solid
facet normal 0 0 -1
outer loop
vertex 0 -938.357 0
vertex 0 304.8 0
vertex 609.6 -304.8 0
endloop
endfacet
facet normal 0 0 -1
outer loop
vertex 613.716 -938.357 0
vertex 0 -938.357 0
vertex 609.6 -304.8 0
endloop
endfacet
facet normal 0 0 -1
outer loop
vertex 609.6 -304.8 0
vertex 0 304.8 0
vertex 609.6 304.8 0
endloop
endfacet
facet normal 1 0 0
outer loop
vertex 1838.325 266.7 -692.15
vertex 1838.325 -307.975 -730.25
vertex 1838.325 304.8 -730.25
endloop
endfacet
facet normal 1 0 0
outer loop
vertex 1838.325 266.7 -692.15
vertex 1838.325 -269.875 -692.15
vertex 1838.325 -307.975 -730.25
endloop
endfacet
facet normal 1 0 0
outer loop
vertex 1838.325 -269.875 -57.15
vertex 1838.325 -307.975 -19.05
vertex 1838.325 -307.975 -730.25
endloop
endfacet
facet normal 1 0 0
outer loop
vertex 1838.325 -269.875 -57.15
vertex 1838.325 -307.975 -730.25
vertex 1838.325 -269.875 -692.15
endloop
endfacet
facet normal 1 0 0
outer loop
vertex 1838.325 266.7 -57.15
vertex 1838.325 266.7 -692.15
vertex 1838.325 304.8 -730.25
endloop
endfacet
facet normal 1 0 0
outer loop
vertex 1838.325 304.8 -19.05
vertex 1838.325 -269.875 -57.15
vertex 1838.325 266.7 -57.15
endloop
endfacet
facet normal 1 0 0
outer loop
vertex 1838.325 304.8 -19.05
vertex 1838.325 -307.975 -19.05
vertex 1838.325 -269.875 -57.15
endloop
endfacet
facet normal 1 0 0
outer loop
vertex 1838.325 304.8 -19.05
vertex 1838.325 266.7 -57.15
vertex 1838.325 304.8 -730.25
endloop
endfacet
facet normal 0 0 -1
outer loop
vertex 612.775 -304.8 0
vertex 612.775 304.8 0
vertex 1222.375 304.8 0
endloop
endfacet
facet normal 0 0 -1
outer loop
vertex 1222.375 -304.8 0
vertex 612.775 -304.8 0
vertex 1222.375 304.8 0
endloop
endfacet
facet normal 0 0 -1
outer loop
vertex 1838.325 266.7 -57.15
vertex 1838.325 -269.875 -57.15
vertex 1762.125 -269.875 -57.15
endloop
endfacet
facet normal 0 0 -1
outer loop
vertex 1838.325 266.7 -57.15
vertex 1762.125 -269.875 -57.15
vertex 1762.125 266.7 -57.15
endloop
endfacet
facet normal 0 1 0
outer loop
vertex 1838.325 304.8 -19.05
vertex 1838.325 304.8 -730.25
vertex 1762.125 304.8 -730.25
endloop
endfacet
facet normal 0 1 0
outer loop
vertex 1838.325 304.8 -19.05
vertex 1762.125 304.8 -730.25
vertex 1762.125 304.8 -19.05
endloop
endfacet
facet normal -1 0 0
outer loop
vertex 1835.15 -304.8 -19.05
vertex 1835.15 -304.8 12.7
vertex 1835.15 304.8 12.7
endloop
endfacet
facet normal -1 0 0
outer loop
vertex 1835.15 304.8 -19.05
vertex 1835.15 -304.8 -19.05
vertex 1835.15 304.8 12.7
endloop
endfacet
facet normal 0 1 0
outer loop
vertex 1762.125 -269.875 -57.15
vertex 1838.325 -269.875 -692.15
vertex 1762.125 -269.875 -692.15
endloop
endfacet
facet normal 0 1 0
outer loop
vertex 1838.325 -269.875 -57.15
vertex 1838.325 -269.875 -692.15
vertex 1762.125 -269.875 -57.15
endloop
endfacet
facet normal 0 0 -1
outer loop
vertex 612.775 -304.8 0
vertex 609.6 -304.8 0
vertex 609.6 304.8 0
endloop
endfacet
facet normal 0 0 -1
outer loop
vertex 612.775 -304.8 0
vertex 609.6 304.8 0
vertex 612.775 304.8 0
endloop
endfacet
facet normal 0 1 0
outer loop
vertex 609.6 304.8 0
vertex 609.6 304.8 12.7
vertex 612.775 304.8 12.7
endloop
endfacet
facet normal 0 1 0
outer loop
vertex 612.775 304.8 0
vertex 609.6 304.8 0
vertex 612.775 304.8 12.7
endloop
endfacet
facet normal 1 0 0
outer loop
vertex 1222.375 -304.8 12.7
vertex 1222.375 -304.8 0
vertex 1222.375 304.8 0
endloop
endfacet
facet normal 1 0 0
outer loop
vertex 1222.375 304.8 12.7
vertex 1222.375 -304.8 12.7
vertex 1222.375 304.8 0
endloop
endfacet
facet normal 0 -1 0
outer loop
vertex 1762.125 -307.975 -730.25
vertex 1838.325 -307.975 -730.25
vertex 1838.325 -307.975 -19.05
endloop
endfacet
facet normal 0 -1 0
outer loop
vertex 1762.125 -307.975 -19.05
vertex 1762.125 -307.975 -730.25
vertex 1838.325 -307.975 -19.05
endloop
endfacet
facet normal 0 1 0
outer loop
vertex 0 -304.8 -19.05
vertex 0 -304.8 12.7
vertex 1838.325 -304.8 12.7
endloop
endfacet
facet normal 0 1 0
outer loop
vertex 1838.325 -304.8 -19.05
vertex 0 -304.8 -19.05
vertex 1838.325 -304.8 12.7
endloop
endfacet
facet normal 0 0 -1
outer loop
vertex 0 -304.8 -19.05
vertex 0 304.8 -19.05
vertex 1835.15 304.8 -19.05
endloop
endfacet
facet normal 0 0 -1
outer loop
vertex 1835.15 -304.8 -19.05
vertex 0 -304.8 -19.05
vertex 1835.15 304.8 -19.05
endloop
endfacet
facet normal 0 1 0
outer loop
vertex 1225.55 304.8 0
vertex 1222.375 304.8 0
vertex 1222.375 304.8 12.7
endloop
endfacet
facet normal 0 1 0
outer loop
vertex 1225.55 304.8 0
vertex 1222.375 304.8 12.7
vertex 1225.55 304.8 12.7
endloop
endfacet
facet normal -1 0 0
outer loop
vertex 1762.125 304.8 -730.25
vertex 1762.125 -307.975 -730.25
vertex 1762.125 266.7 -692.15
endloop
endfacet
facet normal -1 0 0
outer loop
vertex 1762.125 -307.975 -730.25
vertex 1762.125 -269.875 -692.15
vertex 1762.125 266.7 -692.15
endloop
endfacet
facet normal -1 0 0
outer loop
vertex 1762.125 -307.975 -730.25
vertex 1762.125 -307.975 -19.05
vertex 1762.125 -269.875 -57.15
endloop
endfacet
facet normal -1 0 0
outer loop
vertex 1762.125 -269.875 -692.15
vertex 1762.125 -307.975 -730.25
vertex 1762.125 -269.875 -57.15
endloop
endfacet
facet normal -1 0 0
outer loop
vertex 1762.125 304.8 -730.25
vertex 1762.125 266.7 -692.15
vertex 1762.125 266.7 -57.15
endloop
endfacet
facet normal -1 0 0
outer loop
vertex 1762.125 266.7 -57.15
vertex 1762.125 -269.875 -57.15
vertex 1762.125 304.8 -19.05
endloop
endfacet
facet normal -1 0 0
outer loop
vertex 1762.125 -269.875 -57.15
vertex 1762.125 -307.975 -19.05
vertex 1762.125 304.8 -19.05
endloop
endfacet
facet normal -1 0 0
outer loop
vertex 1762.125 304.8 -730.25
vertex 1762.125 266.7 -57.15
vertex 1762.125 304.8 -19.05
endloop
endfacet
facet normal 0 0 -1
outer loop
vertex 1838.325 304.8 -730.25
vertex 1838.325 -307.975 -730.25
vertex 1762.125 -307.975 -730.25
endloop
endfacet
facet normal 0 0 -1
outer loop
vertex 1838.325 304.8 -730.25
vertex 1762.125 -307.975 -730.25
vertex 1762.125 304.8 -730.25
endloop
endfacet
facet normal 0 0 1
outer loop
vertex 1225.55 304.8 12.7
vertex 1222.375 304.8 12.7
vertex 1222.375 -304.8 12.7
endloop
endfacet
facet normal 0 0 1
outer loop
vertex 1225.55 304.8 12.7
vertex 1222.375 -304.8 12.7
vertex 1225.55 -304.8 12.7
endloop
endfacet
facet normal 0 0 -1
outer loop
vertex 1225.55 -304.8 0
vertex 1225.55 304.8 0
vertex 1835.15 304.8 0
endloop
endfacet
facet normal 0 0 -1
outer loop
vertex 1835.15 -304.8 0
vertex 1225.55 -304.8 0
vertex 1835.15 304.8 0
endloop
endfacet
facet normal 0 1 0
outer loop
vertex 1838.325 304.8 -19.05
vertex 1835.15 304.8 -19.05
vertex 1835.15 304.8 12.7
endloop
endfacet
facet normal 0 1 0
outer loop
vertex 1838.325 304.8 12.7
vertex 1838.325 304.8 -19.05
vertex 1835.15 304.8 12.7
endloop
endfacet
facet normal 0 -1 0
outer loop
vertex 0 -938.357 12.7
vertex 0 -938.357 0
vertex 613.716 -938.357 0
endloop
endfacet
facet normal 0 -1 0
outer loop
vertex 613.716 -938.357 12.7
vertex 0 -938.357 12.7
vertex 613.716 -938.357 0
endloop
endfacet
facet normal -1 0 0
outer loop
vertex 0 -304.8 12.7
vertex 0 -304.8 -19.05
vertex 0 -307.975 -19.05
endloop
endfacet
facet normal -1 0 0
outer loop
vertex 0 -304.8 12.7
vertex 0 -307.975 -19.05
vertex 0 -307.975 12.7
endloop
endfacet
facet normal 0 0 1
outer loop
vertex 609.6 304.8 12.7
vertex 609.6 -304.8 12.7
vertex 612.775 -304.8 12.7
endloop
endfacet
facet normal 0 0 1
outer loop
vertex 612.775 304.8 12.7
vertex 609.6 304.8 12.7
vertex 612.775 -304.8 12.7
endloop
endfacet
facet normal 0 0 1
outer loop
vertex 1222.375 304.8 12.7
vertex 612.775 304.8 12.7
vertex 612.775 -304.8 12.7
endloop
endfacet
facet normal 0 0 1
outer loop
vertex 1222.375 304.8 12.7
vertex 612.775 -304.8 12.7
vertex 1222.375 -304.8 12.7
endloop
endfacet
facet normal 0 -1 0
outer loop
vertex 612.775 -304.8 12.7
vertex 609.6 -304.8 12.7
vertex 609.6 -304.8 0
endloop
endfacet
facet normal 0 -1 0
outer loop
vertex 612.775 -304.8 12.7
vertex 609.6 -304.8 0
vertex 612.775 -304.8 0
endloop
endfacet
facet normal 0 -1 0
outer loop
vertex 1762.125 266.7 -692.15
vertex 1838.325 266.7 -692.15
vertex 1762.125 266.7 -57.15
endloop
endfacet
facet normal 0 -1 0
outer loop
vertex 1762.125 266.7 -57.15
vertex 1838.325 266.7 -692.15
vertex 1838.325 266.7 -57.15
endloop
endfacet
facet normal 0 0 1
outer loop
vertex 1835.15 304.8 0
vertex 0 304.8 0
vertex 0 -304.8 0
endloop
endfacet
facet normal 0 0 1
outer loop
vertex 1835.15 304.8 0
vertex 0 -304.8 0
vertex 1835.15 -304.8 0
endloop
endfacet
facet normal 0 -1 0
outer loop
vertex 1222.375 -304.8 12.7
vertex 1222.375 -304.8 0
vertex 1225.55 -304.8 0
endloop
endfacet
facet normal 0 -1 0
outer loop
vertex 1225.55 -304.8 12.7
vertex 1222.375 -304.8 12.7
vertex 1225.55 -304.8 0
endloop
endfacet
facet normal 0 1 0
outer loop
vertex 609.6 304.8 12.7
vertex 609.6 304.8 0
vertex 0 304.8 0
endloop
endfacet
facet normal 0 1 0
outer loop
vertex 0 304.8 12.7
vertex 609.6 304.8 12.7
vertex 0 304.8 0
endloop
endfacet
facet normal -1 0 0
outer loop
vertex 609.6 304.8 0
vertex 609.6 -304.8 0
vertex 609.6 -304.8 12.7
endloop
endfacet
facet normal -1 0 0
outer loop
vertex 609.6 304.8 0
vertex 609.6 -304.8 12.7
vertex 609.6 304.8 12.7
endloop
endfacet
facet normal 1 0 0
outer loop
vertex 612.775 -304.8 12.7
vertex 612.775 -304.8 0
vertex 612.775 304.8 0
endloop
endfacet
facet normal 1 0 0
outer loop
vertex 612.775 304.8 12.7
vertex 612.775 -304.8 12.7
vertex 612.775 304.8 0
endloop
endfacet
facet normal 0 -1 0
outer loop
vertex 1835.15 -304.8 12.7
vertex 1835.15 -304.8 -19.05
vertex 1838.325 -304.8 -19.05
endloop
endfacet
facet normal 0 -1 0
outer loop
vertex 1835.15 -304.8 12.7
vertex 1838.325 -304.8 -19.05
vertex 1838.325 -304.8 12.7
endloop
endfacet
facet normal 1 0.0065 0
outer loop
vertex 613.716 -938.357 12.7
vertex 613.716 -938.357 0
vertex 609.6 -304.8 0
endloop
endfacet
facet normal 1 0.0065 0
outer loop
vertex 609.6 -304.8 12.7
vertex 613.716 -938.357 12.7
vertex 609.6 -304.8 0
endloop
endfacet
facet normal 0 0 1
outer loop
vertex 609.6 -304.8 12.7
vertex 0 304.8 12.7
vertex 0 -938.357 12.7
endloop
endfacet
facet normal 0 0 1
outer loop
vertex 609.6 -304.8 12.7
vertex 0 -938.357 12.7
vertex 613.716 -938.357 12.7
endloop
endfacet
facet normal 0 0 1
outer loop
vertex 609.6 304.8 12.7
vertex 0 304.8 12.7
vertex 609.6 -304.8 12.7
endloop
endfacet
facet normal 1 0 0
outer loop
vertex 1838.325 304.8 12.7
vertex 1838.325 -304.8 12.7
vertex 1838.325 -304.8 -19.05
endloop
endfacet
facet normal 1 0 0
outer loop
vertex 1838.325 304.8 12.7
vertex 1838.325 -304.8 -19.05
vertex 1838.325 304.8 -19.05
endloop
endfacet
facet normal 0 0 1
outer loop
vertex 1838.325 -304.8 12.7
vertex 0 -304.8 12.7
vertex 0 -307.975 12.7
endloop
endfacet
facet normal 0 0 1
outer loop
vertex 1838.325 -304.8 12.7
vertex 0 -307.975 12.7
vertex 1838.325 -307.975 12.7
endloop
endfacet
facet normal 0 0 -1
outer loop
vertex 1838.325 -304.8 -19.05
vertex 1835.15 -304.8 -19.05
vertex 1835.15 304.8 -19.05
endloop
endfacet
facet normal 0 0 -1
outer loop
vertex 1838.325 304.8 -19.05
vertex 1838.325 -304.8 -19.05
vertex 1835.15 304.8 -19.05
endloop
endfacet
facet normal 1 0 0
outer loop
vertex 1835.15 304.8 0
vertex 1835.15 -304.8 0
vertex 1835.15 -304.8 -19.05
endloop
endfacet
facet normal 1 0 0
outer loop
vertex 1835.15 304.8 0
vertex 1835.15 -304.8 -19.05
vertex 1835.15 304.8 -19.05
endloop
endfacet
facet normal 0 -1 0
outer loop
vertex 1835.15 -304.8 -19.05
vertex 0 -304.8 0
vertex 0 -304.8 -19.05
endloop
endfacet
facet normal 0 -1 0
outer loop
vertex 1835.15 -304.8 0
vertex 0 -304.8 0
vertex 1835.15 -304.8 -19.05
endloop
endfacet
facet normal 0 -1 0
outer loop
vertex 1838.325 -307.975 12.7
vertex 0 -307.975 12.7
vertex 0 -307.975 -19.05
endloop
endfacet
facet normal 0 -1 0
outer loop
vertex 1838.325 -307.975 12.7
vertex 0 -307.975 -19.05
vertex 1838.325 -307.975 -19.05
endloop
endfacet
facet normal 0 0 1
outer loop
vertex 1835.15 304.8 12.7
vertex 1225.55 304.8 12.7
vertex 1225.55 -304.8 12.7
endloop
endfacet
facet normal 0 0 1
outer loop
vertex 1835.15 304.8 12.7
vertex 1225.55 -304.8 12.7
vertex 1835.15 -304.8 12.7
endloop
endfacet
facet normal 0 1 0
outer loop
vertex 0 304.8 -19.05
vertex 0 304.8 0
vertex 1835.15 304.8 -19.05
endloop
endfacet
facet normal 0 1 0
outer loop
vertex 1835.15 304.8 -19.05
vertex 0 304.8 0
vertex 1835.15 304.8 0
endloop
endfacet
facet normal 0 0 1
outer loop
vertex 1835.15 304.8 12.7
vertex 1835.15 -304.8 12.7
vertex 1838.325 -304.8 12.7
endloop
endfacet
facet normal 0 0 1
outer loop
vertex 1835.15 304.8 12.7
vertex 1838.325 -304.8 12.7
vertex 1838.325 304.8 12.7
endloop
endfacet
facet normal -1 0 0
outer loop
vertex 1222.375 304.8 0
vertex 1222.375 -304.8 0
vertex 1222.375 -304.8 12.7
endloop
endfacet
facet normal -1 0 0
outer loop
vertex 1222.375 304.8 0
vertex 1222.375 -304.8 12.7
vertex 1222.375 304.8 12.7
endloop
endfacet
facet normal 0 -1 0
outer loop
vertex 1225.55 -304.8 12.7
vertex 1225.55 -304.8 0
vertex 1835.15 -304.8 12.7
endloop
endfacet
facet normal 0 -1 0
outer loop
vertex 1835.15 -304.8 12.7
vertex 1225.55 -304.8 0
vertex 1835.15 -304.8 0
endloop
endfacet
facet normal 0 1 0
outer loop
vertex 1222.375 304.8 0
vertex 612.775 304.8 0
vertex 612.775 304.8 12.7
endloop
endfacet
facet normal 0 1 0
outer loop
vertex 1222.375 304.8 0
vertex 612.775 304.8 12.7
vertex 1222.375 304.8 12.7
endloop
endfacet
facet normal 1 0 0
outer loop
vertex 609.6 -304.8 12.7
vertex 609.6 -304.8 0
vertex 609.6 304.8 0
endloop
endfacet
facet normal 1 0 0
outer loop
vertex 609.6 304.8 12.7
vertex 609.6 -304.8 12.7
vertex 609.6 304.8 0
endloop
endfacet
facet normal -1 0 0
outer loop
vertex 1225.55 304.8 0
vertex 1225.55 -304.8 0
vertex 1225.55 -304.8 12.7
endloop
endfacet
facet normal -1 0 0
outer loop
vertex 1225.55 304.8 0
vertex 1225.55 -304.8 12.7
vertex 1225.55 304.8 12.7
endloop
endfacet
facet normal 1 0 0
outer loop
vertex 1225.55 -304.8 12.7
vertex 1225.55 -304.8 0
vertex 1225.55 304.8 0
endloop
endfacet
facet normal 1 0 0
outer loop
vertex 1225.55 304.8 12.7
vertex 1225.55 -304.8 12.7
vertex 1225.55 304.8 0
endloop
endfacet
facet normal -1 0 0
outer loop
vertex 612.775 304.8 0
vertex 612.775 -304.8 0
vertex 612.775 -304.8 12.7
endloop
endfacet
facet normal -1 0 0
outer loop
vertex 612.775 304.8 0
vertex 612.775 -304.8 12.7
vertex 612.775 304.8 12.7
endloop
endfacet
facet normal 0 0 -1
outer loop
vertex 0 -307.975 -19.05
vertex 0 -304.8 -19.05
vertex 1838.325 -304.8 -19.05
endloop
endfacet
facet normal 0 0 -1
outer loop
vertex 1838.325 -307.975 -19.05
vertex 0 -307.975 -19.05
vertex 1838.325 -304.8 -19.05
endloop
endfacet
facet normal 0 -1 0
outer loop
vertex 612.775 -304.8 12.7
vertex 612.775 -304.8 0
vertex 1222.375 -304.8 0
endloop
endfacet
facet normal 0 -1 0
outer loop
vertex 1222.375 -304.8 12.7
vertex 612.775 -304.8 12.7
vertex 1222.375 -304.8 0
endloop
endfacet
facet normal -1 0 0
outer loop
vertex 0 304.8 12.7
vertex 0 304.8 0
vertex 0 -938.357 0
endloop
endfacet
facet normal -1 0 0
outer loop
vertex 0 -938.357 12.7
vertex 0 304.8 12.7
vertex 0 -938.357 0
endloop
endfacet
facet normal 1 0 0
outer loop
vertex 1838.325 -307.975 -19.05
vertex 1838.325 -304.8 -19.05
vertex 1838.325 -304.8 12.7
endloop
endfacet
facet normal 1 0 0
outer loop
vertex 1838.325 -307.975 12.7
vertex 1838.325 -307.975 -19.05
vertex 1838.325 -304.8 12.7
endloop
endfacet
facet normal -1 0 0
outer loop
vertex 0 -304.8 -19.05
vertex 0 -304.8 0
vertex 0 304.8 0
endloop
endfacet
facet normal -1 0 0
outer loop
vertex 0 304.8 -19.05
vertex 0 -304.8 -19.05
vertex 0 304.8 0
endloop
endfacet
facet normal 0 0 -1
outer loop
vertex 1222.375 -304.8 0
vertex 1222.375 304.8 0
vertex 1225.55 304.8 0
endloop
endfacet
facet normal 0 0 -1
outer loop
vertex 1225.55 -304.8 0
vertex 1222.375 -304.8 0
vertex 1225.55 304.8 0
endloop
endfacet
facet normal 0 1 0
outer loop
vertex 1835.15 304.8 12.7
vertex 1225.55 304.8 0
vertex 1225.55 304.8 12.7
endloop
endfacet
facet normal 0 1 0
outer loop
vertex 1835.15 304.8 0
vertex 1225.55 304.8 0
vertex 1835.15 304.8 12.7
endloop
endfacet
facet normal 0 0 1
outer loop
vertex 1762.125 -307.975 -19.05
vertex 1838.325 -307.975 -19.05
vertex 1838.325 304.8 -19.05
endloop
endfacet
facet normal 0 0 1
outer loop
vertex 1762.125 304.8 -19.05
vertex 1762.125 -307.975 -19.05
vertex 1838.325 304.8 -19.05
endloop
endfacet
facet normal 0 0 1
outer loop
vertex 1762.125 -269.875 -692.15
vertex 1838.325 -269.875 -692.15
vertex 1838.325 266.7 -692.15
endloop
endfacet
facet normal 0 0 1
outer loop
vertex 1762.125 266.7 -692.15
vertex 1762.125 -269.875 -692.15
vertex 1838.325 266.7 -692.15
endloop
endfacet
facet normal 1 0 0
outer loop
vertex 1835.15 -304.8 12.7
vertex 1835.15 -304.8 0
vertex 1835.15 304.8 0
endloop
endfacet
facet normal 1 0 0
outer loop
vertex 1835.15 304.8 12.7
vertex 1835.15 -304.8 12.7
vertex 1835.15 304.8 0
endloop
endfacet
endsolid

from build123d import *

# Parameters (mm, degrees)
F0_W      = 609.6
F0_H      = 609.6
F1_DEPTH  = 12.7
F2_W      = 1835.15
F2_H      = 609.6
F3_DEPTH  = 19.05
F4_W      = 609.6
F4_H      = 31.75
F5_DEPTH  = 3.175
F6_W      = 1838.325
F6_H      = 31.75
F7_DEPTH  = 3.175
F8_W      = 3.175
F8_H      = 609.6
F9_DEPTH  = 12.7
F10_W     = 612.775
F10_H     = 711.2
F10_W_2   = 536.575
F10_H_2   = 635
F11_DEPTH = 76.2


with BuildPart() as f1:
    # F0 (on Top) → F1 (new body)
    with BuildSketch(Plane.XY):
        Polygon((609.6, -304.8), (609.6, 304.8), (0, 304.8), (0, -304.8), (0, -938.357413), (613.716185, -938.357413), align=None)
        with Locations((917.575, 0)):
            Rectangle(F0_W, F0_H)
        with Locations((1530.35, 0)):
            Rectangle(F0_W, F0_H)
    extrude(amount=F1_DEPTH)


with BuildPart() as f3:
    # F2 (on Top) → F3 (new body)
    with BuildSketch(Plane.XY):
        with Locations((917.575, 0)):
            Rectangle(F2_W, F2_H)
    extrude(amount=-F3_DEPTH)


with BuildPart() as f5:
    # F4 (on face) → F5 (new body)
    with BuildSketch(Plane.YZ.offset(1835.15)):
        with Locations((0, -3.175)):
            Rectangle(F4_W, F4_H)
    extrude(amount=F5_DEPTH)


with BuildPart() as f7:
    # F6 (on face) → F7 (new body)
    with BuildSketch(Plane.XZ.offset(304.8)):
        with Locations((919.1625, -3.175)):
            Rectangle(F6_W, F6_H)
    extrude(amount=F7_DEPTH)


with BuildPart() as f9:
    # F8 (on Top) → F9 (new body)
    with BuildSketch(Plane.XY):
        with Locations((611.1875, 0)):
            Rectangle(F8_W, F8_H)
        with Locations((1223.9625, 0)):
            Rectangle(F8_W, F8_H)
    extrude(amount=F9_DEPTH)


with BuildPart() as f11:
    # F10 (on face) → F11 (new body)
    with BuildSketch(Plane.YZ.offset(1838.325)):
        with Locations((-1.5875, -374.65)):
            Rectangle(F10_W, F10_H)
        with Locations((-1.5875, -374.65)):
            Rectangle(F10_W_2, F10_H_2, mode=Mode.SUBTRACT)
    extrude(amount=-F11_DEPTH)


solid = Compound([f1.part, f3.part, f5.part, f7.part, f9.part, f11.part])
